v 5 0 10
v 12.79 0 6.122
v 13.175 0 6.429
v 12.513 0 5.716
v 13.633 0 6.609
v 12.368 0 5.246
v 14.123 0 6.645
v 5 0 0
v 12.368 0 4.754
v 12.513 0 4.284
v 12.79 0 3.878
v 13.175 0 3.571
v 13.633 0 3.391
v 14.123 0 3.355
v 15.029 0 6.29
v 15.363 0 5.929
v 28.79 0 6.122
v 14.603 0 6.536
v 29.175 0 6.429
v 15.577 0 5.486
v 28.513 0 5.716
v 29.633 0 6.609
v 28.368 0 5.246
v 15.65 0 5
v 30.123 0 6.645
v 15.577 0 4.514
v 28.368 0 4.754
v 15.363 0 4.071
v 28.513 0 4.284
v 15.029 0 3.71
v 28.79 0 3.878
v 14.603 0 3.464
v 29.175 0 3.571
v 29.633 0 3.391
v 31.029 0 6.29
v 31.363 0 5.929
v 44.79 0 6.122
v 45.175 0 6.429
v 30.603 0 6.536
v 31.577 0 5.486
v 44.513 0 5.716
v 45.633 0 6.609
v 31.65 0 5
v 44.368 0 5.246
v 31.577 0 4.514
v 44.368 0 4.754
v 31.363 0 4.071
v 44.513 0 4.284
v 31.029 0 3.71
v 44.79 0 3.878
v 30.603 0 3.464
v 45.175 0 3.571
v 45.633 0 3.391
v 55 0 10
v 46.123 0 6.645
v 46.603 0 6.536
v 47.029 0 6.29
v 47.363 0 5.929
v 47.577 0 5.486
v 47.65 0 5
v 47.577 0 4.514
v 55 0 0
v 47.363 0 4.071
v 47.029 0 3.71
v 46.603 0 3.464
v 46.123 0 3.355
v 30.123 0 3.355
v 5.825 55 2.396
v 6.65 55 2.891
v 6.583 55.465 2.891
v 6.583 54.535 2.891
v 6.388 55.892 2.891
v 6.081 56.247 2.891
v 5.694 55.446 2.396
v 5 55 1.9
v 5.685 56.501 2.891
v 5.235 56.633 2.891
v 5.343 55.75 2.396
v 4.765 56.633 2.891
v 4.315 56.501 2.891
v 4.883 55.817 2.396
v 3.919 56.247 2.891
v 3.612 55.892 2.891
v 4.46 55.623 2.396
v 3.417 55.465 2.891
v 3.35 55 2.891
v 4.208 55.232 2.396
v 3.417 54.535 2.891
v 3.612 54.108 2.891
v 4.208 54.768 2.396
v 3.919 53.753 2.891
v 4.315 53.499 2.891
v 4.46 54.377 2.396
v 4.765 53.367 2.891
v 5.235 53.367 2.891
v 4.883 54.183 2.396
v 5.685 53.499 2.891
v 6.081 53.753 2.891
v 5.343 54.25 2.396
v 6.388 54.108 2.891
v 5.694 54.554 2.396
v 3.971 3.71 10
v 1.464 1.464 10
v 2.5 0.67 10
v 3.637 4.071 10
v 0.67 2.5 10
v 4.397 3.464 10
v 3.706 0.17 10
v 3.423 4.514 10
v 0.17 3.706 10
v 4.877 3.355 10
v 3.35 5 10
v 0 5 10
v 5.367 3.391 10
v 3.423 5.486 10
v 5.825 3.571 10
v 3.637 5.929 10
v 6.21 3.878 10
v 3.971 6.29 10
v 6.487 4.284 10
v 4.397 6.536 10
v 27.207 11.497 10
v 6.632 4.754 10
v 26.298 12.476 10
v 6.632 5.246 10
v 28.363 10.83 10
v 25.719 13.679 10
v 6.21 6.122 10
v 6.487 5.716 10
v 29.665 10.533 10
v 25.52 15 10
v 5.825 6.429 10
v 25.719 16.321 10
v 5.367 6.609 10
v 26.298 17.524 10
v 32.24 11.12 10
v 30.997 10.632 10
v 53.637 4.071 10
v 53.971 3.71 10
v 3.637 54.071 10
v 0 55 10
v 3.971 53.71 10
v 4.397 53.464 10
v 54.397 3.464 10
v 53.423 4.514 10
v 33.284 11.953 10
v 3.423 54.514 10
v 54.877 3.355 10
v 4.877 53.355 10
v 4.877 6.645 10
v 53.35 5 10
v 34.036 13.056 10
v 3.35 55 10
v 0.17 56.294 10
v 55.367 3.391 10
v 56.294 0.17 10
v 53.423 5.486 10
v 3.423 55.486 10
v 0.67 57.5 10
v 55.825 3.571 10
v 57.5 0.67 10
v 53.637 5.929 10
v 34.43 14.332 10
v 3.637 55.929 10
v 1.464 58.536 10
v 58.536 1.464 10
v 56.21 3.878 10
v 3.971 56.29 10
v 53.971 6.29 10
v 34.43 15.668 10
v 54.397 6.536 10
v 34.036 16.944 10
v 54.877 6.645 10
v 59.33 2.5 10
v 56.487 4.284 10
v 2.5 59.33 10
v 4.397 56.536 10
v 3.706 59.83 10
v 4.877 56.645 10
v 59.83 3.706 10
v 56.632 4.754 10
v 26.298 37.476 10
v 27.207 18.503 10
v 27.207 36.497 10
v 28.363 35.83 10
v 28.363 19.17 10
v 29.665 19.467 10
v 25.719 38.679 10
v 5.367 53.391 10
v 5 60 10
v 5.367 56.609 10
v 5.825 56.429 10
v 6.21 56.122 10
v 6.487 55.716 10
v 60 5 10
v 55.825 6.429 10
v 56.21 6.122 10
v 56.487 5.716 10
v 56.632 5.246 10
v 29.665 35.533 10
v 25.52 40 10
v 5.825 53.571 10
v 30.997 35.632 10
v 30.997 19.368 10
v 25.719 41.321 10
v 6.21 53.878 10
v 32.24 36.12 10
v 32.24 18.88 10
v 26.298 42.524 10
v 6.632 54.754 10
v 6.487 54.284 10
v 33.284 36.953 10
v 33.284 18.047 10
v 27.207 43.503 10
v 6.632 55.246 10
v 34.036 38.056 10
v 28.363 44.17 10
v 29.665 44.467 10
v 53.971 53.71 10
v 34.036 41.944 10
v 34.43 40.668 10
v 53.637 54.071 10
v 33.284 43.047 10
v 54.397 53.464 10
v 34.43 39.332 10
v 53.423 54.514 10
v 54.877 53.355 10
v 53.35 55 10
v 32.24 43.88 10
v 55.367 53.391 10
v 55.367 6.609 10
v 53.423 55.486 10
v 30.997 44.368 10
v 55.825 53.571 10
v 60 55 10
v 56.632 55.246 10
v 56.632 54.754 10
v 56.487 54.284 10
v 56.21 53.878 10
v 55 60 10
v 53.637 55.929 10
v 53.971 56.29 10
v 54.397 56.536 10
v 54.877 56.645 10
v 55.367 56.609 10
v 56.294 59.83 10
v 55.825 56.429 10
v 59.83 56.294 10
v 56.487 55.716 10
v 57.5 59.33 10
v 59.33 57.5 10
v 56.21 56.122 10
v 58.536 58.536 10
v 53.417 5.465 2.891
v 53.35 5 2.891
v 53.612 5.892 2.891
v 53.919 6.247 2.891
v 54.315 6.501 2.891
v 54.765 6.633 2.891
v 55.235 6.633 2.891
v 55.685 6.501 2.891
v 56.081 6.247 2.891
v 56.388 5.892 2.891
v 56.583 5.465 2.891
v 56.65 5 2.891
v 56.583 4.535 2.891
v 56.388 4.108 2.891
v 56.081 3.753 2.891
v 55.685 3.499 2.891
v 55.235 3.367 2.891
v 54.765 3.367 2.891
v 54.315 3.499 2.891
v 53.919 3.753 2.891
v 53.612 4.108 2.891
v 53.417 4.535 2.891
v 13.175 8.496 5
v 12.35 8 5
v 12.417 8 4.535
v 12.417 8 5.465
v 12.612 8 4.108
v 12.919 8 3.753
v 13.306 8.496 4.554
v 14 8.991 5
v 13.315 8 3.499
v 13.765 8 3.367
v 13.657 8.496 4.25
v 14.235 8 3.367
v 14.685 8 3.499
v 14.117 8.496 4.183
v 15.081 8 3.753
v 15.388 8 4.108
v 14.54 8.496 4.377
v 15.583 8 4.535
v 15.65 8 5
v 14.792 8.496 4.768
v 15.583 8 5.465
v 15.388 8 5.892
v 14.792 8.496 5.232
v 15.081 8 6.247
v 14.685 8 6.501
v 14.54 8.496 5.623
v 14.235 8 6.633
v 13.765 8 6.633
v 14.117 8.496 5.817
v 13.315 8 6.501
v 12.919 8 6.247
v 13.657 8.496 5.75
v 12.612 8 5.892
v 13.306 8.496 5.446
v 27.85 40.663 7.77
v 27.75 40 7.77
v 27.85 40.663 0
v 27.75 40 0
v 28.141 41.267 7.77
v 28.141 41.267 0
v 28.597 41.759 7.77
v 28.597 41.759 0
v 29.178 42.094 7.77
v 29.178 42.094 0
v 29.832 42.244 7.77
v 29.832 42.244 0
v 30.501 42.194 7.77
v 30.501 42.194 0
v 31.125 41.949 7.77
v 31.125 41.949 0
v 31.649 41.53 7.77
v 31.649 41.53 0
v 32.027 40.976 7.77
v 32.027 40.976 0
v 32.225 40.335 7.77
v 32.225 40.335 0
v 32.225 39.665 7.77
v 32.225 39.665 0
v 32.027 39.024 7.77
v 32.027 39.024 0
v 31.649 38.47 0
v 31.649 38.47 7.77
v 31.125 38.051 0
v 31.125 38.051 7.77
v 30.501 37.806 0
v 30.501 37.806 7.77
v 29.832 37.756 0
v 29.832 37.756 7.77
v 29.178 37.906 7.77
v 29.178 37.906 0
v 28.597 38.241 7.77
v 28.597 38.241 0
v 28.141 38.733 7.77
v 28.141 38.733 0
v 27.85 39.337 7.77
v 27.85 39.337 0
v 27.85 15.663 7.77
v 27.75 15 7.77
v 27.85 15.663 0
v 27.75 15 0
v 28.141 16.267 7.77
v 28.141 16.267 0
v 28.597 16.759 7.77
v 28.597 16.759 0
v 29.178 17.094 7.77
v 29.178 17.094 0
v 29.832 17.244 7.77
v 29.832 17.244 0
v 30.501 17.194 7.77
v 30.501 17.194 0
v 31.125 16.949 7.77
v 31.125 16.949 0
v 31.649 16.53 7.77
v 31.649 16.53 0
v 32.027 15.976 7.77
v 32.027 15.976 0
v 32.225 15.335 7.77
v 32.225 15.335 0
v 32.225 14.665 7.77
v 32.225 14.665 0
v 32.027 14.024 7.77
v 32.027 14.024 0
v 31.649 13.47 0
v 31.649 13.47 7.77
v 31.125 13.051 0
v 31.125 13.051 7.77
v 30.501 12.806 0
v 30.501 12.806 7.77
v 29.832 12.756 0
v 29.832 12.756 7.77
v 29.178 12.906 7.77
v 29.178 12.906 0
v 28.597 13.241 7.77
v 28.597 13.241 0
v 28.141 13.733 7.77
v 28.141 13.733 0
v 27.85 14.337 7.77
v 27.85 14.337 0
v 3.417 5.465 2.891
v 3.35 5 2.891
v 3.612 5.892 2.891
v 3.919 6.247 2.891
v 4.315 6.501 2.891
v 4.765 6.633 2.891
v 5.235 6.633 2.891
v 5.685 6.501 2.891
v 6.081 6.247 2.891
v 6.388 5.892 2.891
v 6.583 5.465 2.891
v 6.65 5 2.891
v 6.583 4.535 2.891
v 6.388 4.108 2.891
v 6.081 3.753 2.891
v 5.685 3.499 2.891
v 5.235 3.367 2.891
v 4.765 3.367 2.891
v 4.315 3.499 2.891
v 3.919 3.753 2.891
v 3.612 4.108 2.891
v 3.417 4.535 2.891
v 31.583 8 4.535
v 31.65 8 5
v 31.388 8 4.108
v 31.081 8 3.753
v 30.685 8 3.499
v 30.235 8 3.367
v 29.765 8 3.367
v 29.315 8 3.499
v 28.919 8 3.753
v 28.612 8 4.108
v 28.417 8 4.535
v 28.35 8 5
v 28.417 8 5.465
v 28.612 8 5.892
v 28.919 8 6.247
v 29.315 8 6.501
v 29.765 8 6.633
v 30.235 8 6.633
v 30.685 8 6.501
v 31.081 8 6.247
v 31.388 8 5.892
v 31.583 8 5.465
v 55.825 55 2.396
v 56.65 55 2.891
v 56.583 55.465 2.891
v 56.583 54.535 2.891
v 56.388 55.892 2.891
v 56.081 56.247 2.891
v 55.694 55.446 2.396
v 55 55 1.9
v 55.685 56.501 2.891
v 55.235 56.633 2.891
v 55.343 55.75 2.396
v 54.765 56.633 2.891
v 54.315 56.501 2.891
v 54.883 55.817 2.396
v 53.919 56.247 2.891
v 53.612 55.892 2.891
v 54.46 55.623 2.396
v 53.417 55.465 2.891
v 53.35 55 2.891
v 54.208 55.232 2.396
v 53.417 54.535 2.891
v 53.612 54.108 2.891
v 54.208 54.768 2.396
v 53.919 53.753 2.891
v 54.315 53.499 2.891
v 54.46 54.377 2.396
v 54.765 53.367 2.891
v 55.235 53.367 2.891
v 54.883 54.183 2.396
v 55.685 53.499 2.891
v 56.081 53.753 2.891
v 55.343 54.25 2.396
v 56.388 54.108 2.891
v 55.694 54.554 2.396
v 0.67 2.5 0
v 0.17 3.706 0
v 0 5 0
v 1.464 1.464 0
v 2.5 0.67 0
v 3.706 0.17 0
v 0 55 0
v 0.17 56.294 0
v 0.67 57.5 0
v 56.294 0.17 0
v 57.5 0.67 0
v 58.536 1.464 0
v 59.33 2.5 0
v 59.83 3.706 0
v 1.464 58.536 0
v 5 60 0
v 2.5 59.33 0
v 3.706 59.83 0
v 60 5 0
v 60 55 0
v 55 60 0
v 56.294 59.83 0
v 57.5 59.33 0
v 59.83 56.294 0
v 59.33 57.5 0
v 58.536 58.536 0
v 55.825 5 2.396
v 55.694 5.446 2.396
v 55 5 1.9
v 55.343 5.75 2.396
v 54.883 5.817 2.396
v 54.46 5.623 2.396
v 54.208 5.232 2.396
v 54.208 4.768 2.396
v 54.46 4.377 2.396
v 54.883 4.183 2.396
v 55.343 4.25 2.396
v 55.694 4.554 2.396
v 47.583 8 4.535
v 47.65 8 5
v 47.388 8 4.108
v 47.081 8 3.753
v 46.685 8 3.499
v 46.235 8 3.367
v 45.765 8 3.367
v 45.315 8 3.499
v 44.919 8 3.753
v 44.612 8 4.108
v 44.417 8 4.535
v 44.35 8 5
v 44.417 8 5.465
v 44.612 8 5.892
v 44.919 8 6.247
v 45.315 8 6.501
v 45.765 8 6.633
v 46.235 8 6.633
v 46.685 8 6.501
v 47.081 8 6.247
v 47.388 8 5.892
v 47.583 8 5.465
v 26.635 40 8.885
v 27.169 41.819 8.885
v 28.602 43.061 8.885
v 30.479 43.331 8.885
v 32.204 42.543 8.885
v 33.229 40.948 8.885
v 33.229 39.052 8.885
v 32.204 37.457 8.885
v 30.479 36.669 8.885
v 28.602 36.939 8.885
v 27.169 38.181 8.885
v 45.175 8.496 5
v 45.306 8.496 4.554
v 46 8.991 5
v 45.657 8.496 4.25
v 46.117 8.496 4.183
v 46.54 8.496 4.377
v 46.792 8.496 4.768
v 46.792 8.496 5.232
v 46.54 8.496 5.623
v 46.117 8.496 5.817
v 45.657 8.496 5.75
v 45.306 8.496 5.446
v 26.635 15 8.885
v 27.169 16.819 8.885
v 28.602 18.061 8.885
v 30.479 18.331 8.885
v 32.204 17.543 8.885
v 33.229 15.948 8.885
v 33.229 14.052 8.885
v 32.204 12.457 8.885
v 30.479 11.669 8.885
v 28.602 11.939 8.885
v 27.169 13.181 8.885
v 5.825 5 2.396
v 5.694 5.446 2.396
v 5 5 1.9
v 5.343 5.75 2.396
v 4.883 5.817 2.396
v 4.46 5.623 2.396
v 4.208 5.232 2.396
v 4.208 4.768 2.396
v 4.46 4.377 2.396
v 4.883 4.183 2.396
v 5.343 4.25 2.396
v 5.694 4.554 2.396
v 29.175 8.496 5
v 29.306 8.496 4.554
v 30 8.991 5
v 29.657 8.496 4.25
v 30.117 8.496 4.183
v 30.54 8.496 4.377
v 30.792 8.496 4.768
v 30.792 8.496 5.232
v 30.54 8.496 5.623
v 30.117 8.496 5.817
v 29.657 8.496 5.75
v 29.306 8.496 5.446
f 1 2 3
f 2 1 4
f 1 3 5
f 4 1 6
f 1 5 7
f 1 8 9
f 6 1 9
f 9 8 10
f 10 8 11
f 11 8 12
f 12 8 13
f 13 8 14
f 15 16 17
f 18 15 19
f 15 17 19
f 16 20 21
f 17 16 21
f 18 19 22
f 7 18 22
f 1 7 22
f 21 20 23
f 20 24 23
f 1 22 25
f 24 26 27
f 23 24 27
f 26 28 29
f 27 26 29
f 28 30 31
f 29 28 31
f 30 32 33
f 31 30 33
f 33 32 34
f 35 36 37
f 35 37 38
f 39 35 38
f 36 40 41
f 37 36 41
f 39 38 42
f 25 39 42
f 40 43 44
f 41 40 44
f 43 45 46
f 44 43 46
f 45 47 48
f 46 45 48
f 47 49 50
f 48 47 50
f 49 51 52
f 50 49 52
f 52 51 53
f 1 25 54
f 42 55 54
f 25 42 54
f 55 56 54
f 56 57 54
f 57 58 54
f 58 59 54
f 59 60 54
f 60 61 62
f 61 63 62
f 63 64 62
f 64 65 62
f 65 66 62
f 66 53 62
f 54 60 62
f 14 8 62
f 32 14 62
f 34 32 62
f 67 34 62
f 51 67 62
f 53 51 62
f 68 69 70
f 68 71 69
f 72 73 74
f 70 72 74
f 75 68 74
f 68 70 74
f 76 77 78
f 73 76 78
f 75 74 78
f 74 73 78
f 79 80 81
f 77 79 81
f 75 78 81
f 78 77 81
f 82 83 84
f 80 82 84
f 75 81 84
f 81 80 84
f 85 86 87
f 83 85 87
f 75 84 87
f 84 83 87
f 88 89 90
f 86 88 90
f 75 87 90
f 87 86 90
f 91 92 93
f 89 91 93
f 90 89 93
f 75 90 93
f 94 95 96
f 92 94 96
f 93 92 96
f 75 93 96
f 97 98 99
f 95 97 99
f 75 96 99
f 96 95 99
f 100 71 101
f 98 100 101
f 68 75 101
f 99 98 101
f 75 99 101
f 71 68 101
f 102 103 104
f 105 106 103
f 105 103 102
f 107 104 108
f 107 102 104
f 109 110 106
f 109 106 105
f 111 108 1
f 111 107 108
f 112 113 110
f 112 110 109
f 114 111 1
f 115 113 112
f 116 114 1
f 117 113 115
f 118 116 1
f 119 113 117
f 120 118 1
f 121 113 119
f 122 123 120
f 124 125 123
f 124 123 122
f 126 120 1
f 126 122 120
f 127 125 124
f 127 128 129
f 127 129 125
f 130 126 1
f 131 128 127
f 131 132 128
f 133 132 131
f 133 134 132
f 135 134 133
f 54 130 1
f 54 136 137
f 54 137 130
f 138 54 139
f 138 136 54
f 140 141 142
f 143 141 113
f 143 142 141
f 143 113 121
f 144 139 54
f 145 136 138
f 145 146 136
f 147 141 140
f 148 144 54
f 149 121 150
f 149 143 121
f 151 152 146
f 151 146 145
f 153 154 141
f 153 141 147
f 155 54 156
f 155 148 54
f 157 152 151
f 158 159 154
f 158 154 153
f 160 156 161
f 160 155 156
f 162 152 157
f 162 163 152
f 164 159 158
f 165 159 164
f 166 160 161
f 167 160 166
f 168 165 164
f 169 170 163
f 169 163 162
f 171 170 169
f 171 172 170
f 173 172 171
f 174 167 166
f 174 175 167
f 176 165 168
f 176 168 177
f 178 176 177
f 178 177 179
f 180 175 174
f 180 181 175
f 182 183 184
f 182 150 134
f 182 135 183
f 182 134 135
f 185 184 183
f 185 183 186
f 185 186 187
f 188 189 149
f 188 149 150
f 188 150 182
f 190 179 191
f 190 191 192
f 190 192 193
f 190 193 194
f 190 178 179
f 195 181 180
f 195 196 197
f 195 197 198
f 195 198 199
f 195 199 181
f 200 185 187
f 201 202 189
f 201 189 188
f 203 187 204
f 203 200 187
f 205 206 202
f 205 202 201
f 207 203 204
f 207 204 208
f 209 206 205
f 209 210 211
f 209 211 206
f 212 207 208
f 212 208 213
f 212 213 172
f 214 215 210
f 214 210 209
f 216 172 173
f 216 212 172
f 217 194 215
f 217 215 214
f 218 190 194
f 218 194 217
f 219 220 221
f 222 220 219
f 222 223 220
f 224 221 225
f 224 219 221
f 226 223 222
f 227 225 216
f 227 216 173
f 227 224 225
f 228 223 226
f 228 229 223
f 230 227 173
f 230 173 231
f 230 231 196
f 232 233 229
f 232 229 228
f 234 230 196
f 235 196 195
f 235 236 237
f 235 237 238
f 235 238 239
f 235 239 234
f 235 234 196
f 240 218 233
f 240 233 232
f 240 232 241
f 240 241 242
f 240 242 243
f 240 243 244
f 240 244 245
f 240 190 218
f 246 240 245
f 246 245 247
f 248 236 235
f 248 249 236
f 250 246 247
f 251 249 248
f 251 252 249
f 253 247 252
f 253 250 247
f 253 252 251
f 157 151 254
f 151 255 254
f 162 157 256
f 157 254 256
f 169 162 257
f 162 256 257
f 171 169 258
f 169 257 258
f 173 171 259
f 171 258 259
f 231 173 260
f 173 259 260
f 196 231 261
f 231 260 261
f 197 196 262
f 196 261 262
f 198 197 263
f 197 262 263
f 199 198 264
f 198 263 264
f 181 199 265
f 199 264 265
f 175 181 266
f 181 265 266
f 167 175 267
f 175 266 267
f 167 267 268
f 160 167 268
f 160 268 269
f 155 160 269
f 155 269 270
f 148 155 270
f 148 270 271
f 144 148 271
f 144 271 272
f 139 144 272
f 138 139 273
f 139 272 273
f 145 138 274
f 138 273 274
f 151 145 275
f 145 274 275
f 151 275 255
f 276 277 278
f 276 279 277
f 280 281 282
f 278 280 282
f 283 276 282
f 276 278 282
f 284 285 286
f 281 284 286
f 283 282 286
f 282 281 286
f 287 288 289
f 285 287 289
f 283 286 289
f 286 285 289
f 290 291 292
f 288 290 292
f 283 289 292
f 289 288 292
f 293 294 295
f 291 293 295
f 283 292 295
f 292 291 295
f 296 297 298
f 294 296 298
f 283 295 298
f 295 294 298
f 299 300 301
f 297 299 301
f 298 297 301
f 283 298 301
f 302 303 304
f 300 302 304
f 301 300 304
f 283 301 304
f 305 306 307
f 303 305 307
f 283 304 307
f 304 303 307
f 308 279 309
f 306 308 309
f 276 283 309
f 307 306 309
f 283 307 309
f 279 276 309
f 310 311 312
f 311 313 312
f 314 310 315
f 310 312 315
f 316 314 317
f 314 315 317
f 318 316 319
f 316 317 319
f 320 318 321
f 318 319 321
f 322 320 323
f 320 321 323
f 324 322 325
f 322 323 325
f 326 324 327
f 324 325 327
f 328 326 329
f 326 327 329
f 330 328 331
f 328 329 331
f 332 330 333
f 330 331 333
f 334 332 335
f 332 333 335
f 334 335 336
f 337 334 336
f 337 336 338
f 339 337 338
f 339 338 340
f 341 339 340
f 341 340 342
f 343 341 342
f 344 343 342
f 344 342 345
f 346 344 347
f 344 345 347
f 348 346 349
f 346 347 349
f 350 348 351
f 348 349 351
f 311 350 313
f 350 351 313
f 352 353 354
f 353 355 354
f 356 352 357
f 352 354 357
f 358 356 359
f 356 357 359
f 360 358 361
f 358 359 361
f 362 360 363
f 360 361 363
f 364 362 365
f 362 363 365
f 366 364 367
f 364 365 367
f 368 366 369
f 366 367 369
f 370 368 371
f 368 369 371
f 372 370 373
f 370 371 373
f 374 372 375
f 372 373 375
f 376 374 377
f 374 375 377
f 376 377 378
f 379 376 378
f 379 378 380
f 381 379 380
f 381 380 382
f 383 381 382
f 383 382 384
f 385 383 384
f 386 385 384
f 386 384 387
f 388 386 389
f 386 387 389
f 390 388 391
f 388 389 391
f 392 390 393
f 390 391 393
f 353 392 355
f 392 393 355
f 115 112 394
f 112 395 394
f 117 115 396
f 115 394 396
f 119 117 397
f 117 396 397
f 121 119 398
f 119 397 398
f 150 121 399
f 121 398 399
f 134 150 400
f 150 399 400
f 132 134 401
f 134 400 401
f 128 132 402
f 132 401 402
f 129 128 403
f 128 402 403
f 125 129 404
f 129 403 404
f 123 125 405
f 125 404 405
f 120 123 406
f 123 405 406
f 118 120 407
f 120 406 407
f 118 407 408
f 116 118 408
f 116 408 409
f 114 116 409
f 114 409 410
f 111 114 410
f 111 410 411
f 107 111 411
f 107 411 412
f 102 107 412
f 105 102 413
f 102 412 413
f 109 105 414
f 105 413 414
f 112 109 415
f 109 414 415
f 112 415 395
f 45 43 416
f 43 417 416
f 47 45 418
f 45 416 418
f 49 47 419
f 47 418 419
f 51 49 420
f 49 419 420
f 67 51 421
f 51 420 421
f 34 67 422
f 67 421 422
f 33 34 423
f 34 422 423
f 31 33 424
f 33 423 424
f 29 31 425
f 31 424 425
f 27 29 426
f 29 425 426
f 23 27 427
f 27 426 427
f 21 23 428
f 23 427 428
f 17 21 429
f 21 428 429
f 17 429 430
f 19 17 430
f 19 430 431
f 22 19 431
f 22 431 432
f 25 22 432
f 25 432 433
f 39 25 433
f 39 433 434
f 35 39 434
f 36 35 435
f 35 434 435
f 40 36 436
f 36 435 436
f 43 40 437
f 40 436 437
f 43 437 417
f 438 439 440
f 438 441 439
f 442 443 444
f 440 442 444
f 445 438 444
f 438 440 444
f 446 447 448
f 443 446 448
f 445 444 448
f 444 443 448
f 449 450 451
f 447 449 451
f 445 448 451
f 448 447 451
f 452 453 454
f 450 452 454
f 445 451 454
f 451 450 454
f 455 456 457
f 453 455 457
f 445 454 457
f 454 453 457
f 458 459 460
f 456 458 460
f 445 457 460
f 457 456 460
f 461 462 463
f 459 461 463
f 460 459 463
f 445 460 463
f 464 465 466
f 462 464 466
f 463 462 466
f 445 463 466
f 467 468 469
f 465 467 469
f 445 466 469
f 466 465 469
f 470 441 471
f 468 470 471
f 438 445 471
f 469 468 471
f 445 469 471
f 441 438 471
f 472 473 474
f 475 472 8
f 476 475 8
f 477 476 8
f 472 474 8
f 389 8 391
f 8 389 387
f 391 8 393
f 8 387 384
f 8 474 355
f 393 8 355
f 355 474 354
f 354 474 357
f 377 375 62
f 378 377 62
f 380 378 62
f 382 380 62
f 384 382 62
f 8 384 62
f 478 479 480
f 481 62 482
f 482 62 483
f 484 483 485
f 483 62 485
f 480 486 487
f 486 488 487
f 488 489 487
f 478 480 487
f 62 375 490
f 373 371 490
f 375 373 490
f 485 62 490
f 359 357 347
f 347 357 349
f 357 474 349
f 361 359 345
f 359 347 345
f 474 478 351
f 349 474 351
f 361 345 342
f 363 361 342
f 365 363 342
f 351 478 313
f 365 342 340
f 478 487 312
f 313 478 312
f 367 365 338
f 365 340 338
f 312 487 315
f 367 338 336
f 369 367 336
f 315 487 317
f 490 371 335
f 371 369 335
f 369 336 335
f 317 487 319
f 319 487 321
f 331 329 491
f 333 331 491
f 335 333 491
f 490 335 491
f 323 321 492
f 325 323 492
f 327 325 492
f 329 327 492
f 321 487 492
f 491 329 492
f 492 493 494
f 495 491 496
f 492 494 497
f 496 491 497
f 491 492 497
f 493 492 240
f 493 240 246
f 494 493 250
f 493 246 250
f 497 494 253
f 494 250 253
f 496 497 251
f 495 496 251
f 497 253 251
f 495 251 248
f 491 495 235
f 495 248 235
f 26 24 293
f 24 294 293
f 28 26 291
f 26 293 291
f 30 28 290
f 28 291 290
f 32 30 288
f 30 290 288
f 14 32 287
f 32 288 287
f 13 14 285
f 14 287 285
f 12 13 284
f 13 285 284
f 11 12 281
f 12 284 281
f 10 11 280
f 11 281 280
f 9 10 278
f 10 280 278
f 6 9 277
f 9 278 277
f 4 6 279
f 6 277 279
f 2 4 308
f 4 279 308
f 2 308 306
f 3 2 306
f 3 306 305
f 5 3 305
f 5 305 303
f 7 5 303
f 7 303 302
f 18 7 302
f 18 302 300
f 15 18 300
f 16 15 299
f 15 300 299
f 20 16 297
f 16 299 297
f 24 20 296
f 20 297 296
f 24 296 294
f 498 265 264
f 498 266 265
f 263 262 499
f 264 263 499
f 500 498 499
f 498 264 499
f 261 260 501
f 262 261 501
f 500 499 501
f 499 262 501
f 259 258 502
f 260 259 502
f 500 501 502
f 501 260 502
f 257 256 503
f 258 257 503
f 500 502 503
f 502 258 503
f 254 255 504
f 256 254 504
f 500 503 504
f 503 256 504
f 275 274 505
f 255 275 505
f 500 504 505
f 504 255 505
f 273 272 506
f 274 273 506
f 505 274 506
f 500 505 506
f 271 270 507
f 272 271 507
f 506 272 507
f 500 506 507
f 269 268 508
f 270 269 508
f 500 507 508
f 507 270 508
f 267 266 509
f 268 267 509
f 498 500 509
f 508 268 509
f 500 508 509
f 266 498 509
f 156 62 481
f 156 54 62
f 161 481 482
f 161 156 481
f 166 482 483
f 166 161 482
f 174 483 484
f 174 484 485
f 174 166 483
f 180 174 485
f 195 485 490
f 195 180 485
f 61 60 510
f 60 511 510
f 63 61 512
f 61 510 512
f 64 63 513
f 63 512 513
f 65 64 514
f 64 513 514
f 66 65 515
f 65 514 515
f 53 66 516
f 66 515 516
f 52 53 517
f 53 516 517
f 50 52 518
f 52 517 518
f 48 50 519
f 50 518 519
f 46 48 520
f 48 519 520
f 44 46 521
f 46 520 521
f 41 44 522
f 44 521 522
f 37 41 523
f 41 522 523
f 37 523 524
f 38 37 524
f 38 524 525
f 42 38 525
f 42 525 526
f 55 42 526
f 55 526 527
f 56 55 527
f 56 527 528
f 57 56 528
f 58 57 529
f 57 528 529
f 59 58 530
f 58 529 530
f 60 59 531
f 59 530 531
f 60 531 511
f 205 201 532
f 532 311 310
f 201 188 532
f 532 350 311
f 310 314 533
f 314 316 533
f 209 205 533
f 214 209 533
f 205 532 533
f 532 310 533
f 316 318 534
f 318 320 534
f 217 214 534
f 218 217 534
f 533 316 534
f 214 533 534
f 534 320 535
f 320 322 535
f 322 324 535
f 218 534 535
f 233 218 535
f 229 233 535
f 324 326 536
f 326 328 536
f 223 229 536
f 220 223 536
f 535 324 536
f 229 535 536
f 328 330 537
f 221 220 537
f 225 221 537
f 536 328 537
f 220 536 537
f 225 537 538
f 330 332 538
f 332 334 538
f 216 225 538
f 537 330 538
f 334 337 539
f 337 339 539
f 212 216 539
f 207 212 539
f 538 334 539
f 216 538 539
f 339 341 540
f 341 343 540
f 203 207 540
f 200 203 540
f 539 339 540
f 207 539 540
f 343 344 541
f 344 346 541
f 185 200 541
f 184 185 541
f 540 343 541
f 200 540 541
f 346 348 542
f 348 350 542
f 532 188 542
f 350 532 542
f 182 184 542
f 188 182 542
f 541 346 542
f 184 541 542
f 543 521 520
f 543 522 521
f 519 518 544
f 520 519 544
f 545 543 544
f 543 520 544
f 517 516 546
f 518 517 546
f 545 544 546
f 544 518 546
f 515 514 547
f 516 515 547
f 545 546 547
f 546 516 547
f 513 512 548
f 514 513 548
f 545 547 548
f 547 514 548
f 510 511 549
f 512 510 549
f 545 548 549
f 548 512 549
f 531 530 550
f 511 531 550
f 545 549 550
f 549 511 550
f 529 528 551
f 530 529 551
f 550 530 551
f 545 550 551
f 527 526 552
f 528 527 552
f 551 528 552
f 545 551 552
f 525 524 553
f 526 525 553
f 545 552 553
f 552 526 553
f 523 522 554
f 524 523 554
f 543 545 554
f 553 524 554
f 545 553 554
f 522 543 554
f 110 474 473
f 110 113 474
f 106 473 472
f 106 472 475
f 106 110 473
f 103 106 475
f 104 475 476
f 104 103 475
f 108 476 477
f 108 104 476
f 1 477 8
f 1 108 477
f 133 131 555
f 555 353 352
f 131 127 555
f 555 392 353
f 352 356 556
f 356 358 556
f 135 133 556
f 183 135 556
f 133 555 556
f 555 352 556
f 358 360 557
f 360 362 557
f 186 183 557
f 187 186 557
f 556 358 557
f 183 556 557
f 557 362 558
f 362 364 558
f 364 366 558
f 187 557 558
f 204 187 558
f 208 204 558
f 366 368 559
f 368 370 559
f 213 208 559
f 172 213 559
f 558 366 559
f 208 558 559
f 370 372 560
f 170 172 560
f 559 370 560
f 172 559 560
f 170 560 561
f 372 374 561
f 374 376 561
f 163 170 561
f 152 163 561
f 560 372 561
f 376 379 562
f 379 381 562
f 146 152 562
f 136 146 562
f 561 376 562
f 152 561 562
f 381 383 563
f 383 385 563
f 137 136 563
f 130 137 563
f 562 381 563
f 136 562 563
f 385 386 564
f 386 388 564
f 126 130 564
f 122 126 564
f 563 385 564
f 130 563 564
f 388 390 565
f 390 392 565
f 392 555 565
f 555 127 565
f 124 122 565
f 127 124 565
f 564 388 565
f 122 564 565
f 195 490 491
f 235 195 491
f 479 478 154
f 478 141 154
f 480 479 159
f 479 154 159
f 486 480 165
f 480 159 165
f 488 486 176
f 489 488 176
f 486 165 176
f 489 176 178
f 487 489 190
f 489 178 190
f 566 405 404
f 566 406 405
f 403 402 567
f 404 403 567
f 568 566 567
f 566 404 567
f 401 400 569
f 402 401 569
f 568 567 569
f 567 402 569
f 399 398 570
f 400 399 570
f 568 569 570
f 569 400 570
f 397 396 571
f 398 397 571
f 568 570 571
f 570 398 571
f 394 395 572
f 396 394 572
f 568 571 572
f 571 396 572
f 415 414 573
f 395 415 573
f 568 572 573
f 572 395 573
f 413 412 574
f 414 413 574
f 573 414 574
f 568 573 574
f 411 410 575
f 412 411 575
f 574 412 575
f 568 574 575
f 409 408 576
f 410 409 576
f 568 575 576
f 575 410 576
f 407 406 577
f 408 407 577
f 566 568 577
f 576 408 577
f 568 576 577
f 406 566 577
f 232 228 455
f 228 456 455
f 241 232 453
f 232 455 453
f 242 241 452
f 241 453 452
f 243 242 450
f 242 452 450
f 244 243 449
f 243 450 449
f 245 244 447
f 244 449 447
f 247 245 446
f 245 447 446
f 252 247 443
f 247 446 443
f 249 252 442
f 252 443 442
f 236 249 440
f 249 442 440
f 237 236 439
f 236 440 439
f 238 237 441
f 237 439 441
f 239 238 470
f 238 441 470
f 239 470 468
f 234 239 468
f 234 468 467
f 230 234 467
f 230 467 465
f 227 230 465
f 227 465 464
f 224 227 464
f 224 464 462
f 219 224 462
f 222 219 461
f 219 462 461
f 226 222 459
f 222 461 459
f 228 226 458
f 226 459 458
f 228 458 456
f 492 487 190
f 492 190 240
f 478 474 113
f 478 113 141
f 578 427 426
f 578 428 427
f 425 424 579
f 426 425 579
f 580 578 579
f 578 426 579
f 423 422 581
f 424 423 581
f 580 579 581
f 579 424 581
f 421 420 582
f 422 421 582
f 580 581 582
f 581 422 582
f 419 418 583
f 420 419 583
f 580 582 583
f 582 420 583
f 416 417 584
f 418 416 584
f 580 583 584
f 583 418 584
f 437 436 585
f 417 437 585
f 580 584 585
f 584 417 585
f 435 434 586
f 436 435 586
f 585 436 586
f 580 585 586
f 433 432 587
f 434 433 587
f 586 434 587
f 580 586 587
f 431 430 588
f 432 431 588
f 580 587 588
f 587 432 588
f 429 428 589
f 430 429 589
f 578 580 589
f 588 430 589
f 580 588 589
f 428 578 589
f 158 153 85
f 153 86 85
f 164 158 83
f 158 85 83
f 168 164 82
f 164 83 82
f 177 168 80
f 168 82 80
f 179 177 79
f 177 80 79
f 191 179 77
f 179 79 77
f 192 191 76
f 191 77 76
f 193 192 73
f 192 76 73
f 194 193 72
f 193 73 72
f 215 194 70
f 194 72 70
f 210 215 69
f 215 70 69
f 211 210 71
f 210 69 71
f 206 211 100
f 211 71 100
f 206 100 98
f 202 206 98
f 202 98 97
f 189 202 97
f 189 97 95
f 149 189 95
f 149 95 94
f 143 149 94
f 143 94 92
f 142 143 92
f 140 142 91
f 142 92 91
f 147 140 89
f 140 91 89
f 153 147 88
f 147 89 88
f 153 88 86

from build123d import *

# Parameters (mm, degrees)
SKETCH1_W                                            = 60
SKETCH1_H                                            = 60
BOSS_EXTRUDE1_DEPTH                                  = 10
M4_TAPPED_HOLE1_D                                    = 3.3
M4_TAPPED_HOLE1_DEPTH                                = 7.108579979
M4_TAPPED_HOLE1_TIP                                  = 0.991420021
CSK_FOR_M4_HEX_SOCKET_COUNTERSUNK_CAP_SC_D           = 4.5
CSK_FOR_M4_HEX_SOCKET_COUNTERSUNK_CAP_SC_CSINK_D     = 8.96
CSK_FOR_M4_HEX_SOCKET_COUNTERSUNK_CAP_SC_CSINK_ANGLE = 90
M4_TAPPED_HOLE2_D                                    = 3.3
M4_TAPPED_HOLE2_DEPTH                                = 8
M4_TAPPED_HOLE2_TIP                                  = 0.991420021
FILLET1_R                                            = 5


with BuildPart() as part:
    # Sketch1 → Boss-Extrude1 (new body)
    with BuildSketch(Plane.XY):
        with Locations((30, 30)):
            Rectangle(SKETCH1_W, SKETCH1_H)
    extrude(amount=BOSS_EXTRUDE1_DEPTH)

    # M4 Tapped Hole1
    with Locations(Plane.XY.offset(10)):
        with Locations((5, 55), (55, 55), (55, 5), (5, 5)):
            Hole(M4_TAPPED_HOLE1_D / 2, depth=M4_TAPPED_HOLE1_DEPTH)
            with Locations((0, 0, -(M4_TAPPED_HOLE1_DEPTH + M4_TAPPED_HOLE1_TIP / 2))):  # 118° drill point
                Cone(0, M4_TAPPED_HOLE1_D / 2, M4_TAPPED_HOLE1_TIP, mode=Mode.SUBTRACT)

    # CSK for M4 Hex Socket Countersunk Cap Screw1 (through all)
    with Locations(Plane.XY.offset(10)):
        with Locations((30, 40), (30, 15)):
            CounterSinkHole(CSK_FOR_M4_HEX_SOCKET_COUNTERSUNK_CAP_SC_D / 2, CSK_FOR_M4_HEX_SOCKET_COUNTERSUNK_CAP_SC_CSINK_D / 2, counter_sink_angle=CSK_FOR_M4_HEX_SOCKET_COUNTERSUNK_CAP_SC_CSINK_ANGLE)

    # M4 Tapped Hole2
    with Locations(Plane(origin=(0, 0, 0), x_dir=(-1, 0, 0), z_dir=(0, -1, 0))):
        with Locations((-30, -5), (-14, -5), (-46, -5)):
            Hole(M4_TAPPED_HOLE2_D / 2, depth=M4_TAPPED_HOLE2_DEPTH)
            with Locations((0, 0, -(M4_TAPPED_HOLE2_DEPTH + M4_TAPPED_HOLE2_TIP / 2))):  # 118° drill point
                Cone(0, M4_TAPPED_HOLE2_D / 2, M4_TAPPED_HOLE2_TIP, mode=Mode.SUBTRACT)

    # Fillet1
    fillet1_edges = [part.edges().sort_by_distance(p)[0] for p in [
        (0, 60, 5),
        (60, 60, 5),
        (60, 0, 5),
        (0, 0, 5),
    ]]
    fillet(fillet1_edges, radius=FILLET1_R)


solid = part.part
